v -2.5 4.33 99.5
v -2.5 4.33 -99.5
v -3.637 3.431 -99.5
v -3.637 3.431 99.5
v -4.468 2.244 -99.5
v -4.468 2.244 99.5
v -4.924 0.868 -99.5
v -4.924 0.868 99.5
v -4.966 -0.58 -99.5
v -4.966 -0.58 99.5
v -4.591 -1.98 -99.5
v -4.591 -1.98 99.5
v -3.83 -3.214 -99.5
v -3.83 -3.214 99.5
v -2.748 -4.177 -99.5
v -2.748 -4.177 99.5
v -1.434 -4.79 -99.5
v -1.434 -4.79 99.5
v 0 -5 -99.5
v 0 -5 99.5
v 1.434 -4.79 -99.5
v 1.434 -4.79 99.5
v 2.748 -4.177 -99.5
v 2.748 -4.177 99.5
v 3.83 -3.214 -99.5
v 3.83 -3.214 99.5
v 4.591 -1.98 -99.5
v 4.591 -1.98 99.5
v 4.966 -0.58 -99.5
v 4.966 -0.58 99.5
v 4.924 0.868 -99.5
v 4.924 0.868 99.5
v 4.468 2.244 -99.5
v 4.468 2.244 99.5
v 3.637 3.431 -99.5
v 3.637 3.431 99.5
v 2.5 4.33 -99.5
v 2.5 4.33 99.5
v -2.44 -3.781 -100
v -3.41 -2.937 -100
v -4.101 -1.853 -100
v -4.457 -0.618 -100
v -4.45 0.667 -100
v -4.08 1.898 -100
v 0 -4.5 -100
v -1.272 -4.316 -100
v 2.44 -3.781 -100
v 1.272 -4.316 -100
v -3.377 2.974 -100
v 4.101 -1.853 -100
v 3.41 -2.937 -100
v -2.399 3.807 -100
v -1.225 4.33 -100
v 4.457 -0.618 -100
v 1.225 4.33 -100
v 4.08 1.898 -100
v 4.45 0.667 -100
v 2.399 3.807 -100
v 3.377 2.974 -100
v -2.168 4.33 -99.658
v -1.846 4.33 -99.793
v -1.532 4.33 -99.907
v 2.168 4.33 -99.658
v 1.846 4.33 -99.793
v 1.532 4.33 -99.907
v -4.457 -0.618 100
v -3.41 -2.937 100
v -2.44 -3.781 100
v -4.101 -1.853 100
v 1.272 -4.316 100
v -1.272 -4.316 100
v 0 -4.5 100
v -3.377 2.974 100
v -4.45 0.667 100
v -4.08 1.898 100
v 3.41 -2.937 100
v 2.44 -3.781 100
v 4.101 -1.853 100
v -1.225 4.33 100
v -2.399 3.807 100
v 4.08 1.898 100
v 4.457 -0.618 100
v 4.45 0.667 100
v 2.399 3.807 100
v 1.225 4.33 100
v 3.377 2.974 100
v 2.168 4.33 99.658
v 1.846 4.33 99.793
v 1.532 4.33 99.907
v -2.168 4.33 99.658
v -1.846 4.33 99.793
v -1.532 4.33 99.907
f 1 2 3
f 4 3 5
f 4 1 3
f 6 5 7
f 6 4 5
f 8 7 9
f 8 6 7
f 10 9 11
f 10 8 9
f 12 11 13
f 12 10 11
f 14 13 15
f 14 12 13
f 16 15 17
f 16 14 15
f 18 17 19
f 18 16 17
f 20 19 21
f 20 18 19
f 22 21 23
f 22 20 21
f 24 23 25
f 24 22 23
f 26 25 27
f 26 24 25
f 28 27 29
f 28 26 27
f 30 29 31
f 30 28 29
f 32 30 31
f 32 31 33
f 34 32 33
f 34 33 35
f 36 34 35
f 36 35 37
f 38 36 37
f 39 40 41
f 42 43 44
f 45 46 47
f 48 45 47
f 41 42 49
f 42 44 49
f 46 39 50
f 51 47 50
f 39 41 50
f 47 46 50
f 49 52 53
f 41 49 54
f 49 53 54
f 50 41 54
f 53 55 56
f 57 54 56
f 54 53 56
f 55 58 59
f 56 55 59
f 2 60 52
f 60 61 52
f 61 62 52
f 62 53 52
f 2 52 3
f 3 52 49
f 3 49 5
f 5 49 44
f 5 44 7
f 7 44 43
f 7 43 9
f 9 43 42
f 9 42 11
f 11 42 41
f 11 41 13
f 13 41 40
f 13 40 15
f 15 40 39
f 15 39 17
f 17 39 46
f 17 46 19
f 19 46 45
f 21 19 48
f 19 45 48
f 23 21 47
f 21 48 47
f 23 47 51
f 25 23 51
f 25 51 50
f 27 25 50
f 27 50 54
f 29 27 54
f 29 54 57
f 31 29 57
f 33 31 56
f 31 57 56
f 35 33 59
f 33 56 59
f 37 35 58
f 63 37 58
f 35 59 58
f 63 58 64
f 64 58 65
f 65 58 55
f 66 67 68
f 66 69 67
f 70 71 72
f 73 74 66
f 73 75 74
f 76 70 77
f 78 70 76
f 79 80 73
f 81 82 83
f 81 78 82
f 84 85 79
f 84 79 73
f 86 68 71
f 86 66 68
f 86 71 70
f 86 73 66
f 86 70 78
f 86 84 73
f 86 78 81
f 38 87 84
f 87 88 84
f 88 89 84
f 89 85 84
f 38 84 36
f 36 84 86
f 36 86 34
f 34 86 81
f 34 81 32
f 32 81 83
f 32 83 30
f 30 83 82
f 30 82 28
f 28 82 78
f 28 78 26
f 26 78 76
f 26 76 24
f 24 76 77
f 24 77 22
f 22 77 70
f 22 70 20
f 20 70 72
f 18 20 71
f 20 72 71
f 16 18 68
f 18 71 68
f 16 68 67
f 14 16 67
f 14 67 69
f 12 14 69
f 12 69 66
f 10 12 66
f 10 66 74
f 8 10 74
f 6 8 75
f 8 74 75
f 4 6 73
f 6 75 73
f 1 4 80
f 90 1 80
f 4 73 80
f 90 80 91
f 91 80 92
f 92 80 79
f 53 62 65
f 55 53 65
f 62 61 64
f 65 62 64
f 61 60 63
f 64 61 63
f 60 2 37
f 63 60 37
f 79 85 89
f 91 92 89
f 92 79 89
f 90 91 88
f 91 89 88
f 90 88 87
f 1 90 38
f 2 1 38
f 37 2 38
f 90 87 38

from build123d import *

# Parameters (mm, degrees)
SKETCH3_R                = 5
BOSS_EXTRUDE2_DEPTH      = 100
BOSS_EXTRUDE2_DEPTH_BACK = 100
CUT_EXTRUDE5_DEPTH       = 101
CUT_EXTRUDE5_DEPTH_BACK  = 101
CHAMFER1_SIZE            = 0.5


with BuildPart() as part:
    # Sketch3 → Boss-Extrude2 (new body, two sides)
    with BuildSketch(Plane.XY) as boss_extrude2_sk:
        Circle(SKETCH3_R)
    extrude(amount=BOSS_EXTRUDE2_DEPTH)
    extrude(boss_extrude2_sk.sketch, amount=-BOSS_EXTRUDE2_DEPTH_BACK)

    # Sketch10 → Cut-Extrude5 (cut, two sides)
    with BuildSketch(Plane.XY) as cut_extrude5_sk:
        with BuildLine():
            Line((-2.5, 4.330127019), (2.5, 4.330127019))
            ThreePointArc((2.5, 4.330127019), (0, 5), (-2.5, 4.330127019))
        make_face()
    extrude(amount=CUT_EXTRUDE5_DEPTH, mode=Mode.SUBTRACT)
    extrude(cut_extrude5_sk.sketch, amount=-CUT_EXTRUDE5_DEPTH_BACK, mode=Mode.SUBTRACT)

    # Chamfer1
    chamfer1_edges = [part.edges().sort_by_distance(p)[0] for p in [
        (0, -5, -100),
        (0, -5, 100),
    ]]
    chamfer(chamfer1_edges, length=CHAMFER1_SIZE)


solid = part.part
